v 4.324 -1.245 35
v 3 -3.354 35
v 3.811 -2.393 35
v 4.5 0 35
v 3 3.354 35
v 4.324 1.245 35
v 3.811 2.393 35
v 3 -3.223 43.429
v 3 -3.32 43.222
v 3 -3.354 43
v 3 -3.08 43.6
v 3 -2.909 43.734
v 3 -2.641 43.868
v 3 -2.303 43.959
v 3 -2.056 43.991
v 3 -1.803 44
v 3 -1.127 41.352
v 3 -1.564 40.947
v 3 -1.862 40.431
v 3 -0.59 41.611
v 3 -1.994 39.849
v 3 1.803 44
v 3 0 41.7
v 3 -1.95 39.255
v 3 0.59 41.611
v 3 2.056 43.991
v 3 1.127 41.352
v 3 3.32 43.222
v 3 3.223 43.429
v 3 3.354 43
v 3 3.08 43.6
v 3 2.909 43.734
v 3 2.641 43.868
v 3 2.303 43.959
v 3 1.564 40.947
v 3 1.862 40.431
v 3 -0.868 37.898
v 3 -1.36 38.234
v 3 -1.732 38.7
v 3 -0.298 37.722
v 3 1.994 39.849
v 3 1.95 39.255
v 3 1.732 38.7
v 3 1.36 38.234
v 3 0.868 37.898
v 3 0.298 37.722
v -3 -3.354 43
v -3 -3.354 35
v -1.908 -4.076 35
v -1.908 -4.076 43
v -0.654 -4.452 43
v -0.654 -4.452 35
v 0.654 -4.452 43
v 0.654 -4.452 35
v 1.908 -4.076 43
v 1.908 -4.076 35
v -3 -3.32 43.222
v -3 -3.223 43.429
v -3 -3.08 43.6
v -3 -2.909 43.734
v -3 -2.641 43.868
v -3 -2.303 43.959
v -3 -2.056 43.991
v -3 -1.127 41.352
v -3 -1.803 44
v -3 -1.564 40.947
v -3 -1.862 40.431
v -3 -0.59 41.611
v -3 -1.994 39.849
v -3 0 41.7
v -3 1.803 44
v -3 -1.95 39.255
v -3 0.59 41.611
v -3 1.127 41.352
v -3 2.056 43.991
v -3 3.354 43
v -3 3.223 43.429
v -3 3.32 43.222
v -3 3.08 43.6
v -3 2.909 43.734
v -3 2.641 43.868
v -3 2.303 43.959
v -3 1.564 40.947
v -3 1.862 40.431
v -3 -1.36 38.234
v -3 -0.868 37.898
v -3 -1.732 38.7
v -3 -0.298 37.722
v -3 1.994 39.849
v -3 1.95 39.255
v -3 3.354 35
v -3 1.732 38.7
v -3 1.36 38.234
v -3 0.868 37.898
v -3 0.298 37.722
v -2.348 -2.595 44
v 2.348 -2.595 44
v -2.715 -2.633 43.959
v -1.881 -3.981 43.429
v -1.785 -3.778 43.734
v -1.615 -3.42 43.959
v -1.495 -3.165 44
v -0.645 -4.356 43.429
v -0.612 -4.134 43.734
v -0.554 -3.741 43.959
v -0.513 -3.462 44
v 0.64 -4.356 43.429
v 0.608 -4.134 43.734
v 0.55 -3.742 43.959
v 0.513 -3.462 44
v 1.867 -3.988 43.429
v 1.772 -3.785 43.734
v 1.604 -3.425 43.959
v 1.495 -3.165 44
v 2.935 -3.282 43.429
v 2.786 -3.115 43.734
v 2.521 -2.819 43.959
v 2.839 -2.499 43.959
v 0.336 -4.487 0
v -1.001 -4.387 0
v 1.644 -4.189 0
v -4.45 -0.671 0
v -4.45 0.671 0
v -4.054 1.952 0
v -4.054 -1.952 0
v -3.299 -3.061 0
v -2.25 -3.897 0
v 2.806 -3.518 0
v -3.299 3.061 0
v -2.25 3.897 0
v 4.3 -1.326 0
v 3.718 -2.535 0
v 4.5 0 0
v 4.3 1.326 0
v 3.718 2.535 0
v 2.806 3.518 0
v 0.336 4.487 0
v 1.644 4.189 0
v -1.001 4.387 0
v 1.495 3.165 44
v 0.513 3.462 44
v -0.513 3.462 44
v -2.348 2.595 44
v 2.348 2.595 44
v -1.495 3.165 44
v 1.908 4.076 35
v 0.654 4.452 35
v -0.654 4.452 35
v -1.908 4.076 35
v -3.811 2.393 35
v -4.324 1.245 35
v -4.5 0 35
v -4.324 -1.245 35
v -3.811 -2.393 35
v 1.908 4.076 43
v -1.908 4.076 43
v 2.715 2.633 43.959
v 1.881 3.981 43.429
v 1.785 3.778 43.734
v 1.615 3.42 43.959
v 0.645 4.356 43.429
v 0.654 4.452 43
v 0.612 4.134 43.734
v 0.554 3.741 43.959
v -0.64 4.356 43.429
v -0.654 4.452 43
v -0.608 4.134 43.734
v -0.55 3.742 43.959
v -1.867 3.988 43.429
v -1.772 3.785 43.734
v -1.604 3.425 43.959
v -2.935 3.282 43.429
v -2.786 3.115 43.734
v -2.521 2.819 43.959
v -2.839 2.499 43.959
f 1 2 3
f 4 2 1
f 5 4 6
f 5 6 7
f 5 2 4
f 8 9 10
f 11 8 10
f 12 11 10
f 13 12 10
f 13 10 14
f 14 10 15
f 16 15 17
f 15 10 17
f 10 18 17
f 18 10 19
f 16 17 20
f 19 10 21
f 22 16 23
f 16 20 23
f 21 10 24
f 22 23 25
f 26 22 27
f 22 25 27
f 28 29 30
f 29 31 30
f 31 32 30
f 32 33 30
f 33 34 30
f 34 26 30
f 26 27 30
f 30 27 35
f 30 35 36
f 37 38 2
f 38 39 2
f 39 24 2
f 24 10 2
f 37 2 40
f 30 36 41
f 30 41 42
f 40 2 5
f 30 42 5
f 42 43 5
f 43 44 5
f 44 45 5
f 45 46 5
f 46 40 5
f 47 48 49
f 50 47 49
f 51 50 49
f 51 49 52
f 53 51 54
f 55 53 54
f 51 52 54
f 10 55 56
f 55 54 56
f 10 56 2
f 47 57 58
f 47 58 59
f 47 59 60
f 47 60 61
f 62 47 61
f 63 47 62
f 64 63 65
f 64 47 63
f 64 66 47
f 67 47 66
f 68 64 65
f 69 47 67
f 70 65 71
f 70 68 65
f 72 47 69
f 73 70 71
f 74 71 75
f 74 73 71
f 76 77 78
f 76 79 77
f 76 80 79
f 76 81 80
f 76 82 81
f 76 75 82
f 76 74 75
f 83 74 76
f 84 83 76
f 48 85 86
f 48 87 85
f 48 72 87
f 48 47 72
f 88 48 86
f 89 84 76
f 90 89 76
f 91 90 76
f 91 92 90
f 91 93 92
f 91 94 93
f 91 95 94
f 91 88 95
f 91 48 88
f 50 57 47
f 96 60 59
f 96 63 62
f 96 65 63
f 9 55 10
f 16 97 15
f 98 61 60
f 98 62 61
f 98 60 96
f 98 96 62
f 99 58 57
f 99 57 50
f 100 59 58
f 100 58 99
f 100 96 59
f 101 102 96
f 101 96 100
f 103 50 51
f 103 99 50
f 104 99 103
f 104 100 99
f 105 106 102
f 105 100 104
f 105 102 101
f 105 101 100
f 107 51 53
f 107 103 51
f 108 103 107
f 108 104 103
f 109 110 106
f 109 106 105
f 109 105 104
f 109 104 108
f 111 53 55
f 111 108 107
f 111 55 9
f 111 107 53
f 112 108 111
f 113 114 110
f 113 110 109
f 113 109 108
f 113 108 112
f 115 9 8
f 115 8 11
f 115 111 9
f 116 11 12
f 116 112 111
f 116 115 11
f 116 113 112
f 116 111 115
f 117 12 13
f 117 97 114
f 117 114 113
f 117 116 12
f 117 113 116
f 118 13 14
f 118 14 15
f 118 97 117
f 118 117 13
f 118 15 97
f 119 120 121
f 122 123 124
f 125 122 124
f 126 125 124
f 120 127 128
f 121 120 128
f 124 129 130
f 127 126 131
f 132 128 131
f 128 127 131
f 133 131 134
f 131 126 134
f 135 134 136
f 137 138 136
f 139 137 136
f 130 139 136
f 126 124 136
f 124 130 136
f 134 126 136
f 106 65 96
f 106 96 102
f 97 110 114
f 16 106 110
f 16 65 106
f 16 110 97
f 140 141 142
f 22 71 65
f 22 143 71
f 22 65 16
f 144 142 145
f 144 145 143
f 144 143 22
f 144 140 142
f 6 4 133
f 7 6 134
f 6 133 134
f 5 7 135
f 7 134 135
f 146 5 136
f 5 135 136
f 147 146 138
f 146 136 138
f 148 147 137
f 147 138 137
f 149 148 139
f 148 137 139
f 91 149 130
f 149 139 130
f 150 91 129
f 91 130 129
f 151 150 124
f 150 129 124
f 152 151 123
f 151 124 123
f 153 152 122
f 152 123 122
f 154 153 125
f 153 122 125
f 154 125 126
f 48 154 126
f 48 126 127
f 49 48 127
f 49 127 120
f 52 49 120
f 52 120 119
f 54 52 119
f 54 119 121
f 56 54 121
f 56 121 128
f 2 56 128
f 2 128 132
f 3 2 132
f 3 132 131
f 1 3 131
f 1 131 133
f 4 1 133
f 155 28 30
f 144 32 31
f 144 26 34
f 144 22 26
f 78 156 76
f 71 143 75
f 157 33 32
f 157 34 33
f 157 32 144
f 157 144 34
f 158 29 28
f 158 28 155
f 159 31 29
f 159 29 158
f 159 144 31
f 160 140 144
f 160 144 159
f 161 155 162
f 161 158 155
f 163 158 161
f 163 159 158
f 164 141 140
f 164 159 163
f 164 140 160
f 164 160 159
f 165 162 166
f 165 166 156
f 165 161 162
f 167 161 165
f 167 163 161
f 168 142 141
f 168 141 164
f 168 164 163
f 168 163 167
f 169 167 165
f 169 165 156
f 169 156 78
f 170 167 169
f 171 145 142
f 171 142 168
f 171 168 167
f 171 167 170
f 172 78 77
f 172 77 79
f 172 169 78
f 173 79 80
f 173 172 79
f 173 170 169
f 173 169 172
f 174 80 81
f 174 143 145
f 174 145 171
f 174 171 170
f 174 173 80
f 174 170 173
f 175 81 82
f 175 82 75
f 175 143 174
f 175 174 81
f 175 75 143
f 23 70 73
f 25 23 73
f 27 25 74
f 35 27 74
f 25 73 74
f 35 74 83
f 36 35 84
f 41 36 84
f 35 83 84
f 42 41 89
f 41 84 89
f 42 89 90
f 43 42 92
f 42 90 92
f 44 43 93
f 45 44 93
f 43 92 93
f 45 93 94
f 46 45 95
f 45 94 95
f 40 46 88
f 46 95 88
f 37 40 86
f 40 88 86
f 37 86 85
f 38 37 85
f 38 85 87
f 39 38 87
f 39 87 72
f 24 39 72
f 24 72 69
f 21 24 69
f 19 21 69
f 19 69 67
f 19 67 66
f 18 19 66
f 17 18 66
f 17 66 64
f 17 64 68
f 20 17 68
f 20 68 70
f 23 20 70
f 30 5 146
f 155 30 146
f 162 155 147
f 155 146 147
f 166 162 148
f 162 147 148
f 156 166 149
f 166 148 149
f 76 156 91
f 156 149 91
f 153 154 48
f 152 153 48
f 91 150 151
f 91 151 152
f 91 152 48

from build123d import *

# Parameters (mm, degrees)
SKETCH_1_R          = 4.5
EXTRUDE_1_DEPTH     = 35
SKETCH_2_W          = 6
SKETCH_2_H          = 6.708203932
EXTRUDE_2_DEPTH     = 9
SKETCH_3_R          = 2
CUT_EXTRUDE_1_DEPTH = 45.860896112
FILLET_1_R          = 1


with BuildPart() as part:
    # Эскиз1 → Бобышка-Вытянуть1 (new body)
    with BuildSketch(Plane.XY):
        Circle(SKETCH_1_R)
    extrude(amount=EXTRUDE_1_DEPTH)

    # Эскиз2 → Бобышка-Вытянуть2 (add)
    with BuildSketch(Plane.XY.offset(35)):
        with BuildLine():
            Line((-3, 3.354101966), (3, 3.354101966))
            ThreePointArc((3, 3.354101966), (0, 4.5), (-3, 3.354101966))
        make_face()
        Rectangle(SKETCH_2_W, SKETCH_2_H)
        with BuildLine():
            ThreePointArc((-3, -3.354101966), (0, -4.5), (3, -3.354101966))
            Line((3, -3.354101966), (-3, -3.354101966))
        make_face()
    extrude(amount=EXTRUDE_2_DEPTH)

    # Эскиз3 → Вырез-Вытянуть1 (cut, through all)
    with BuildSketch(Plane.ZY.offset(3)):
        with Locations((39.7, 0)):
            Circle(SKETCH_3_R)
    extrude(amount=-CUT_EXTRUDE_1_DEPTH, mode=Mode.SUBTRACT)

    # Скругление1
    fillet_1_edges = [part.edges().sort_by_distance(p)[0] for p in [
        (0, 4.5, 44),
        (0, -4.5, 44),
    ]]
    fillet(fillet_1_edges, radius=FILLET_1_R)


solid = part.part
